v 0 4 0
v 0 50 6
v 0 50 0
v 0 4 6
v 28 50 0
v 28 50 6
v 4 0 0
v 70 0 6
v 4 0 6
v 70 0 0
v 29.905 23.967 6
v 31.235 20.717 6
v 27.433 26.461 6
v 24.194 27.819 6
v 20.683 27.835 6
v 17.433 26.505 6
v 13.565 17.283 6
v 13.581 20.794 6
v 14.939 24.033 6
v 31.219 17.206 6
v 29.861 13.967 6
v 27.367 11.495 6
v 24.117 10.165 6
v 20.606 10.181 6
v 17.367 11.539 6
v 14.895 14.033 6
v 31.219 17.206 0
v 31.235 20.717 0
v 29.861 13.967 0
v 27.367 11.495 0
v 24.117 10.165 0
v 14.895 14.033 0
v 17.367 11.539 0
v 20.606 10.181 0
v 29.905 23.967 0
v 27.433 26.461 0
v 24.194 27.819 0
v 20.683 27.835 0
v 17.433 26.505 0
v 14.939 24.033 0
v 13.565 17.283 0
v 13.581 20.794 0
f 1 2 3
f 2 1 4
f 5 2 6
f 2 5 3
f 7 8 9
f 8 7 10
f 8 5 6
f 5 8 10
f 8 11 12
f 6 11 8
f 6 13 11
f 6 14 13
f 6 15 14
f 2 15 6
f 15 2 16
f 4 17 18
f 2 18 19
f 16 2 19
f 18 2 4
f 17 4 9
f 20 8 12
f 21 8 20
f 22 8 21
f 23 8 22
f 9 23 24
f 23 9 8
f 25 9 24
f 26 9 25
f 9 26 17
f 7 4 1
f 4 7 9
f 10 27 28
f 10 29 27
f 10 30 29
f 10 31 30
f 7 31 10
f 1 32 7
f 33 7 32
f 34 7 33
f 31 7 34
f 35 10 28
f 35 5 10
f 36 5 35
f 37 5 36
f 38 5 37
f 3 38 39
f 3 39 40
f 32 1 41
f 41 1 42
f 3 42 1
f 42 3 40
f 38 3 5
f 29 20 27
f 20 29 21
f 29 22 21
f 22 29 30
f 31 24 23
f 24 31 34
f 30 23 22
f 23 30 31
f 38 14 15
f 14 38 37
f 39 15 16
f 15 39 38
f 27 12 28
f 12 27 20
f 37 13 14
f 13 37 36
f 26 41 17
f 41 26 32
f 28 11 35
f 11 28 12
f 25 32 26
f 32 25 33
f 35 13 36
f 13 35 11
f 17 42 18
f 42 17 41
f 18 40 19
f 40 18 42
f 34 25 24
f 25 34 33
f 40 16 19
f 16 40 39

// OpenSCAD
$fn = 32;

// ----------------------------------------------------------------------
// Bracket plate: gusset 70 x 50
// ----------------------------------------------------------------------

// --- parameters (mm) ---
hole_r = 3.5;             // bolt hole radius
plate_t = 6;              // plate thickness, Z (extrusion height)
gus_a = 70;               // base length
gus_b = 50;               // height
top_x = 28;               // top edge X of the angled cut
light_r = 9;              // lightening hole radius

light_d = 2 * light_r;

profile = [[4, 0], [35, 0], [70, 0], [28, 50], [0, 50], [0, 4]];  // primary outline, 6 points, counter clockwise
void_1 = [[31.235, 20.717], [29.905, 23.967], [27.433, 26.461], [24.194, 27.819], [20.683, 27.835], [17.433, 26.505], [14.939, 24.033], [13.581, 20.794], [13.565, 17.283], [14.895, 14.033], [17.367, 11.539], [20.606, 10.181], [24.117, 10.165], [27.367, 11.495], [29.861, 13.967], [31.219, 17.206]];  // lightening hole, 16 points

// --- the one profile operation ---
difference() {
  linear_extrude(height = plate_t) polygon(points = profile);
  translate([0, 0, -1])
    linear_extrude(height = plate_t + 2) polygon(points = void_1);
}
